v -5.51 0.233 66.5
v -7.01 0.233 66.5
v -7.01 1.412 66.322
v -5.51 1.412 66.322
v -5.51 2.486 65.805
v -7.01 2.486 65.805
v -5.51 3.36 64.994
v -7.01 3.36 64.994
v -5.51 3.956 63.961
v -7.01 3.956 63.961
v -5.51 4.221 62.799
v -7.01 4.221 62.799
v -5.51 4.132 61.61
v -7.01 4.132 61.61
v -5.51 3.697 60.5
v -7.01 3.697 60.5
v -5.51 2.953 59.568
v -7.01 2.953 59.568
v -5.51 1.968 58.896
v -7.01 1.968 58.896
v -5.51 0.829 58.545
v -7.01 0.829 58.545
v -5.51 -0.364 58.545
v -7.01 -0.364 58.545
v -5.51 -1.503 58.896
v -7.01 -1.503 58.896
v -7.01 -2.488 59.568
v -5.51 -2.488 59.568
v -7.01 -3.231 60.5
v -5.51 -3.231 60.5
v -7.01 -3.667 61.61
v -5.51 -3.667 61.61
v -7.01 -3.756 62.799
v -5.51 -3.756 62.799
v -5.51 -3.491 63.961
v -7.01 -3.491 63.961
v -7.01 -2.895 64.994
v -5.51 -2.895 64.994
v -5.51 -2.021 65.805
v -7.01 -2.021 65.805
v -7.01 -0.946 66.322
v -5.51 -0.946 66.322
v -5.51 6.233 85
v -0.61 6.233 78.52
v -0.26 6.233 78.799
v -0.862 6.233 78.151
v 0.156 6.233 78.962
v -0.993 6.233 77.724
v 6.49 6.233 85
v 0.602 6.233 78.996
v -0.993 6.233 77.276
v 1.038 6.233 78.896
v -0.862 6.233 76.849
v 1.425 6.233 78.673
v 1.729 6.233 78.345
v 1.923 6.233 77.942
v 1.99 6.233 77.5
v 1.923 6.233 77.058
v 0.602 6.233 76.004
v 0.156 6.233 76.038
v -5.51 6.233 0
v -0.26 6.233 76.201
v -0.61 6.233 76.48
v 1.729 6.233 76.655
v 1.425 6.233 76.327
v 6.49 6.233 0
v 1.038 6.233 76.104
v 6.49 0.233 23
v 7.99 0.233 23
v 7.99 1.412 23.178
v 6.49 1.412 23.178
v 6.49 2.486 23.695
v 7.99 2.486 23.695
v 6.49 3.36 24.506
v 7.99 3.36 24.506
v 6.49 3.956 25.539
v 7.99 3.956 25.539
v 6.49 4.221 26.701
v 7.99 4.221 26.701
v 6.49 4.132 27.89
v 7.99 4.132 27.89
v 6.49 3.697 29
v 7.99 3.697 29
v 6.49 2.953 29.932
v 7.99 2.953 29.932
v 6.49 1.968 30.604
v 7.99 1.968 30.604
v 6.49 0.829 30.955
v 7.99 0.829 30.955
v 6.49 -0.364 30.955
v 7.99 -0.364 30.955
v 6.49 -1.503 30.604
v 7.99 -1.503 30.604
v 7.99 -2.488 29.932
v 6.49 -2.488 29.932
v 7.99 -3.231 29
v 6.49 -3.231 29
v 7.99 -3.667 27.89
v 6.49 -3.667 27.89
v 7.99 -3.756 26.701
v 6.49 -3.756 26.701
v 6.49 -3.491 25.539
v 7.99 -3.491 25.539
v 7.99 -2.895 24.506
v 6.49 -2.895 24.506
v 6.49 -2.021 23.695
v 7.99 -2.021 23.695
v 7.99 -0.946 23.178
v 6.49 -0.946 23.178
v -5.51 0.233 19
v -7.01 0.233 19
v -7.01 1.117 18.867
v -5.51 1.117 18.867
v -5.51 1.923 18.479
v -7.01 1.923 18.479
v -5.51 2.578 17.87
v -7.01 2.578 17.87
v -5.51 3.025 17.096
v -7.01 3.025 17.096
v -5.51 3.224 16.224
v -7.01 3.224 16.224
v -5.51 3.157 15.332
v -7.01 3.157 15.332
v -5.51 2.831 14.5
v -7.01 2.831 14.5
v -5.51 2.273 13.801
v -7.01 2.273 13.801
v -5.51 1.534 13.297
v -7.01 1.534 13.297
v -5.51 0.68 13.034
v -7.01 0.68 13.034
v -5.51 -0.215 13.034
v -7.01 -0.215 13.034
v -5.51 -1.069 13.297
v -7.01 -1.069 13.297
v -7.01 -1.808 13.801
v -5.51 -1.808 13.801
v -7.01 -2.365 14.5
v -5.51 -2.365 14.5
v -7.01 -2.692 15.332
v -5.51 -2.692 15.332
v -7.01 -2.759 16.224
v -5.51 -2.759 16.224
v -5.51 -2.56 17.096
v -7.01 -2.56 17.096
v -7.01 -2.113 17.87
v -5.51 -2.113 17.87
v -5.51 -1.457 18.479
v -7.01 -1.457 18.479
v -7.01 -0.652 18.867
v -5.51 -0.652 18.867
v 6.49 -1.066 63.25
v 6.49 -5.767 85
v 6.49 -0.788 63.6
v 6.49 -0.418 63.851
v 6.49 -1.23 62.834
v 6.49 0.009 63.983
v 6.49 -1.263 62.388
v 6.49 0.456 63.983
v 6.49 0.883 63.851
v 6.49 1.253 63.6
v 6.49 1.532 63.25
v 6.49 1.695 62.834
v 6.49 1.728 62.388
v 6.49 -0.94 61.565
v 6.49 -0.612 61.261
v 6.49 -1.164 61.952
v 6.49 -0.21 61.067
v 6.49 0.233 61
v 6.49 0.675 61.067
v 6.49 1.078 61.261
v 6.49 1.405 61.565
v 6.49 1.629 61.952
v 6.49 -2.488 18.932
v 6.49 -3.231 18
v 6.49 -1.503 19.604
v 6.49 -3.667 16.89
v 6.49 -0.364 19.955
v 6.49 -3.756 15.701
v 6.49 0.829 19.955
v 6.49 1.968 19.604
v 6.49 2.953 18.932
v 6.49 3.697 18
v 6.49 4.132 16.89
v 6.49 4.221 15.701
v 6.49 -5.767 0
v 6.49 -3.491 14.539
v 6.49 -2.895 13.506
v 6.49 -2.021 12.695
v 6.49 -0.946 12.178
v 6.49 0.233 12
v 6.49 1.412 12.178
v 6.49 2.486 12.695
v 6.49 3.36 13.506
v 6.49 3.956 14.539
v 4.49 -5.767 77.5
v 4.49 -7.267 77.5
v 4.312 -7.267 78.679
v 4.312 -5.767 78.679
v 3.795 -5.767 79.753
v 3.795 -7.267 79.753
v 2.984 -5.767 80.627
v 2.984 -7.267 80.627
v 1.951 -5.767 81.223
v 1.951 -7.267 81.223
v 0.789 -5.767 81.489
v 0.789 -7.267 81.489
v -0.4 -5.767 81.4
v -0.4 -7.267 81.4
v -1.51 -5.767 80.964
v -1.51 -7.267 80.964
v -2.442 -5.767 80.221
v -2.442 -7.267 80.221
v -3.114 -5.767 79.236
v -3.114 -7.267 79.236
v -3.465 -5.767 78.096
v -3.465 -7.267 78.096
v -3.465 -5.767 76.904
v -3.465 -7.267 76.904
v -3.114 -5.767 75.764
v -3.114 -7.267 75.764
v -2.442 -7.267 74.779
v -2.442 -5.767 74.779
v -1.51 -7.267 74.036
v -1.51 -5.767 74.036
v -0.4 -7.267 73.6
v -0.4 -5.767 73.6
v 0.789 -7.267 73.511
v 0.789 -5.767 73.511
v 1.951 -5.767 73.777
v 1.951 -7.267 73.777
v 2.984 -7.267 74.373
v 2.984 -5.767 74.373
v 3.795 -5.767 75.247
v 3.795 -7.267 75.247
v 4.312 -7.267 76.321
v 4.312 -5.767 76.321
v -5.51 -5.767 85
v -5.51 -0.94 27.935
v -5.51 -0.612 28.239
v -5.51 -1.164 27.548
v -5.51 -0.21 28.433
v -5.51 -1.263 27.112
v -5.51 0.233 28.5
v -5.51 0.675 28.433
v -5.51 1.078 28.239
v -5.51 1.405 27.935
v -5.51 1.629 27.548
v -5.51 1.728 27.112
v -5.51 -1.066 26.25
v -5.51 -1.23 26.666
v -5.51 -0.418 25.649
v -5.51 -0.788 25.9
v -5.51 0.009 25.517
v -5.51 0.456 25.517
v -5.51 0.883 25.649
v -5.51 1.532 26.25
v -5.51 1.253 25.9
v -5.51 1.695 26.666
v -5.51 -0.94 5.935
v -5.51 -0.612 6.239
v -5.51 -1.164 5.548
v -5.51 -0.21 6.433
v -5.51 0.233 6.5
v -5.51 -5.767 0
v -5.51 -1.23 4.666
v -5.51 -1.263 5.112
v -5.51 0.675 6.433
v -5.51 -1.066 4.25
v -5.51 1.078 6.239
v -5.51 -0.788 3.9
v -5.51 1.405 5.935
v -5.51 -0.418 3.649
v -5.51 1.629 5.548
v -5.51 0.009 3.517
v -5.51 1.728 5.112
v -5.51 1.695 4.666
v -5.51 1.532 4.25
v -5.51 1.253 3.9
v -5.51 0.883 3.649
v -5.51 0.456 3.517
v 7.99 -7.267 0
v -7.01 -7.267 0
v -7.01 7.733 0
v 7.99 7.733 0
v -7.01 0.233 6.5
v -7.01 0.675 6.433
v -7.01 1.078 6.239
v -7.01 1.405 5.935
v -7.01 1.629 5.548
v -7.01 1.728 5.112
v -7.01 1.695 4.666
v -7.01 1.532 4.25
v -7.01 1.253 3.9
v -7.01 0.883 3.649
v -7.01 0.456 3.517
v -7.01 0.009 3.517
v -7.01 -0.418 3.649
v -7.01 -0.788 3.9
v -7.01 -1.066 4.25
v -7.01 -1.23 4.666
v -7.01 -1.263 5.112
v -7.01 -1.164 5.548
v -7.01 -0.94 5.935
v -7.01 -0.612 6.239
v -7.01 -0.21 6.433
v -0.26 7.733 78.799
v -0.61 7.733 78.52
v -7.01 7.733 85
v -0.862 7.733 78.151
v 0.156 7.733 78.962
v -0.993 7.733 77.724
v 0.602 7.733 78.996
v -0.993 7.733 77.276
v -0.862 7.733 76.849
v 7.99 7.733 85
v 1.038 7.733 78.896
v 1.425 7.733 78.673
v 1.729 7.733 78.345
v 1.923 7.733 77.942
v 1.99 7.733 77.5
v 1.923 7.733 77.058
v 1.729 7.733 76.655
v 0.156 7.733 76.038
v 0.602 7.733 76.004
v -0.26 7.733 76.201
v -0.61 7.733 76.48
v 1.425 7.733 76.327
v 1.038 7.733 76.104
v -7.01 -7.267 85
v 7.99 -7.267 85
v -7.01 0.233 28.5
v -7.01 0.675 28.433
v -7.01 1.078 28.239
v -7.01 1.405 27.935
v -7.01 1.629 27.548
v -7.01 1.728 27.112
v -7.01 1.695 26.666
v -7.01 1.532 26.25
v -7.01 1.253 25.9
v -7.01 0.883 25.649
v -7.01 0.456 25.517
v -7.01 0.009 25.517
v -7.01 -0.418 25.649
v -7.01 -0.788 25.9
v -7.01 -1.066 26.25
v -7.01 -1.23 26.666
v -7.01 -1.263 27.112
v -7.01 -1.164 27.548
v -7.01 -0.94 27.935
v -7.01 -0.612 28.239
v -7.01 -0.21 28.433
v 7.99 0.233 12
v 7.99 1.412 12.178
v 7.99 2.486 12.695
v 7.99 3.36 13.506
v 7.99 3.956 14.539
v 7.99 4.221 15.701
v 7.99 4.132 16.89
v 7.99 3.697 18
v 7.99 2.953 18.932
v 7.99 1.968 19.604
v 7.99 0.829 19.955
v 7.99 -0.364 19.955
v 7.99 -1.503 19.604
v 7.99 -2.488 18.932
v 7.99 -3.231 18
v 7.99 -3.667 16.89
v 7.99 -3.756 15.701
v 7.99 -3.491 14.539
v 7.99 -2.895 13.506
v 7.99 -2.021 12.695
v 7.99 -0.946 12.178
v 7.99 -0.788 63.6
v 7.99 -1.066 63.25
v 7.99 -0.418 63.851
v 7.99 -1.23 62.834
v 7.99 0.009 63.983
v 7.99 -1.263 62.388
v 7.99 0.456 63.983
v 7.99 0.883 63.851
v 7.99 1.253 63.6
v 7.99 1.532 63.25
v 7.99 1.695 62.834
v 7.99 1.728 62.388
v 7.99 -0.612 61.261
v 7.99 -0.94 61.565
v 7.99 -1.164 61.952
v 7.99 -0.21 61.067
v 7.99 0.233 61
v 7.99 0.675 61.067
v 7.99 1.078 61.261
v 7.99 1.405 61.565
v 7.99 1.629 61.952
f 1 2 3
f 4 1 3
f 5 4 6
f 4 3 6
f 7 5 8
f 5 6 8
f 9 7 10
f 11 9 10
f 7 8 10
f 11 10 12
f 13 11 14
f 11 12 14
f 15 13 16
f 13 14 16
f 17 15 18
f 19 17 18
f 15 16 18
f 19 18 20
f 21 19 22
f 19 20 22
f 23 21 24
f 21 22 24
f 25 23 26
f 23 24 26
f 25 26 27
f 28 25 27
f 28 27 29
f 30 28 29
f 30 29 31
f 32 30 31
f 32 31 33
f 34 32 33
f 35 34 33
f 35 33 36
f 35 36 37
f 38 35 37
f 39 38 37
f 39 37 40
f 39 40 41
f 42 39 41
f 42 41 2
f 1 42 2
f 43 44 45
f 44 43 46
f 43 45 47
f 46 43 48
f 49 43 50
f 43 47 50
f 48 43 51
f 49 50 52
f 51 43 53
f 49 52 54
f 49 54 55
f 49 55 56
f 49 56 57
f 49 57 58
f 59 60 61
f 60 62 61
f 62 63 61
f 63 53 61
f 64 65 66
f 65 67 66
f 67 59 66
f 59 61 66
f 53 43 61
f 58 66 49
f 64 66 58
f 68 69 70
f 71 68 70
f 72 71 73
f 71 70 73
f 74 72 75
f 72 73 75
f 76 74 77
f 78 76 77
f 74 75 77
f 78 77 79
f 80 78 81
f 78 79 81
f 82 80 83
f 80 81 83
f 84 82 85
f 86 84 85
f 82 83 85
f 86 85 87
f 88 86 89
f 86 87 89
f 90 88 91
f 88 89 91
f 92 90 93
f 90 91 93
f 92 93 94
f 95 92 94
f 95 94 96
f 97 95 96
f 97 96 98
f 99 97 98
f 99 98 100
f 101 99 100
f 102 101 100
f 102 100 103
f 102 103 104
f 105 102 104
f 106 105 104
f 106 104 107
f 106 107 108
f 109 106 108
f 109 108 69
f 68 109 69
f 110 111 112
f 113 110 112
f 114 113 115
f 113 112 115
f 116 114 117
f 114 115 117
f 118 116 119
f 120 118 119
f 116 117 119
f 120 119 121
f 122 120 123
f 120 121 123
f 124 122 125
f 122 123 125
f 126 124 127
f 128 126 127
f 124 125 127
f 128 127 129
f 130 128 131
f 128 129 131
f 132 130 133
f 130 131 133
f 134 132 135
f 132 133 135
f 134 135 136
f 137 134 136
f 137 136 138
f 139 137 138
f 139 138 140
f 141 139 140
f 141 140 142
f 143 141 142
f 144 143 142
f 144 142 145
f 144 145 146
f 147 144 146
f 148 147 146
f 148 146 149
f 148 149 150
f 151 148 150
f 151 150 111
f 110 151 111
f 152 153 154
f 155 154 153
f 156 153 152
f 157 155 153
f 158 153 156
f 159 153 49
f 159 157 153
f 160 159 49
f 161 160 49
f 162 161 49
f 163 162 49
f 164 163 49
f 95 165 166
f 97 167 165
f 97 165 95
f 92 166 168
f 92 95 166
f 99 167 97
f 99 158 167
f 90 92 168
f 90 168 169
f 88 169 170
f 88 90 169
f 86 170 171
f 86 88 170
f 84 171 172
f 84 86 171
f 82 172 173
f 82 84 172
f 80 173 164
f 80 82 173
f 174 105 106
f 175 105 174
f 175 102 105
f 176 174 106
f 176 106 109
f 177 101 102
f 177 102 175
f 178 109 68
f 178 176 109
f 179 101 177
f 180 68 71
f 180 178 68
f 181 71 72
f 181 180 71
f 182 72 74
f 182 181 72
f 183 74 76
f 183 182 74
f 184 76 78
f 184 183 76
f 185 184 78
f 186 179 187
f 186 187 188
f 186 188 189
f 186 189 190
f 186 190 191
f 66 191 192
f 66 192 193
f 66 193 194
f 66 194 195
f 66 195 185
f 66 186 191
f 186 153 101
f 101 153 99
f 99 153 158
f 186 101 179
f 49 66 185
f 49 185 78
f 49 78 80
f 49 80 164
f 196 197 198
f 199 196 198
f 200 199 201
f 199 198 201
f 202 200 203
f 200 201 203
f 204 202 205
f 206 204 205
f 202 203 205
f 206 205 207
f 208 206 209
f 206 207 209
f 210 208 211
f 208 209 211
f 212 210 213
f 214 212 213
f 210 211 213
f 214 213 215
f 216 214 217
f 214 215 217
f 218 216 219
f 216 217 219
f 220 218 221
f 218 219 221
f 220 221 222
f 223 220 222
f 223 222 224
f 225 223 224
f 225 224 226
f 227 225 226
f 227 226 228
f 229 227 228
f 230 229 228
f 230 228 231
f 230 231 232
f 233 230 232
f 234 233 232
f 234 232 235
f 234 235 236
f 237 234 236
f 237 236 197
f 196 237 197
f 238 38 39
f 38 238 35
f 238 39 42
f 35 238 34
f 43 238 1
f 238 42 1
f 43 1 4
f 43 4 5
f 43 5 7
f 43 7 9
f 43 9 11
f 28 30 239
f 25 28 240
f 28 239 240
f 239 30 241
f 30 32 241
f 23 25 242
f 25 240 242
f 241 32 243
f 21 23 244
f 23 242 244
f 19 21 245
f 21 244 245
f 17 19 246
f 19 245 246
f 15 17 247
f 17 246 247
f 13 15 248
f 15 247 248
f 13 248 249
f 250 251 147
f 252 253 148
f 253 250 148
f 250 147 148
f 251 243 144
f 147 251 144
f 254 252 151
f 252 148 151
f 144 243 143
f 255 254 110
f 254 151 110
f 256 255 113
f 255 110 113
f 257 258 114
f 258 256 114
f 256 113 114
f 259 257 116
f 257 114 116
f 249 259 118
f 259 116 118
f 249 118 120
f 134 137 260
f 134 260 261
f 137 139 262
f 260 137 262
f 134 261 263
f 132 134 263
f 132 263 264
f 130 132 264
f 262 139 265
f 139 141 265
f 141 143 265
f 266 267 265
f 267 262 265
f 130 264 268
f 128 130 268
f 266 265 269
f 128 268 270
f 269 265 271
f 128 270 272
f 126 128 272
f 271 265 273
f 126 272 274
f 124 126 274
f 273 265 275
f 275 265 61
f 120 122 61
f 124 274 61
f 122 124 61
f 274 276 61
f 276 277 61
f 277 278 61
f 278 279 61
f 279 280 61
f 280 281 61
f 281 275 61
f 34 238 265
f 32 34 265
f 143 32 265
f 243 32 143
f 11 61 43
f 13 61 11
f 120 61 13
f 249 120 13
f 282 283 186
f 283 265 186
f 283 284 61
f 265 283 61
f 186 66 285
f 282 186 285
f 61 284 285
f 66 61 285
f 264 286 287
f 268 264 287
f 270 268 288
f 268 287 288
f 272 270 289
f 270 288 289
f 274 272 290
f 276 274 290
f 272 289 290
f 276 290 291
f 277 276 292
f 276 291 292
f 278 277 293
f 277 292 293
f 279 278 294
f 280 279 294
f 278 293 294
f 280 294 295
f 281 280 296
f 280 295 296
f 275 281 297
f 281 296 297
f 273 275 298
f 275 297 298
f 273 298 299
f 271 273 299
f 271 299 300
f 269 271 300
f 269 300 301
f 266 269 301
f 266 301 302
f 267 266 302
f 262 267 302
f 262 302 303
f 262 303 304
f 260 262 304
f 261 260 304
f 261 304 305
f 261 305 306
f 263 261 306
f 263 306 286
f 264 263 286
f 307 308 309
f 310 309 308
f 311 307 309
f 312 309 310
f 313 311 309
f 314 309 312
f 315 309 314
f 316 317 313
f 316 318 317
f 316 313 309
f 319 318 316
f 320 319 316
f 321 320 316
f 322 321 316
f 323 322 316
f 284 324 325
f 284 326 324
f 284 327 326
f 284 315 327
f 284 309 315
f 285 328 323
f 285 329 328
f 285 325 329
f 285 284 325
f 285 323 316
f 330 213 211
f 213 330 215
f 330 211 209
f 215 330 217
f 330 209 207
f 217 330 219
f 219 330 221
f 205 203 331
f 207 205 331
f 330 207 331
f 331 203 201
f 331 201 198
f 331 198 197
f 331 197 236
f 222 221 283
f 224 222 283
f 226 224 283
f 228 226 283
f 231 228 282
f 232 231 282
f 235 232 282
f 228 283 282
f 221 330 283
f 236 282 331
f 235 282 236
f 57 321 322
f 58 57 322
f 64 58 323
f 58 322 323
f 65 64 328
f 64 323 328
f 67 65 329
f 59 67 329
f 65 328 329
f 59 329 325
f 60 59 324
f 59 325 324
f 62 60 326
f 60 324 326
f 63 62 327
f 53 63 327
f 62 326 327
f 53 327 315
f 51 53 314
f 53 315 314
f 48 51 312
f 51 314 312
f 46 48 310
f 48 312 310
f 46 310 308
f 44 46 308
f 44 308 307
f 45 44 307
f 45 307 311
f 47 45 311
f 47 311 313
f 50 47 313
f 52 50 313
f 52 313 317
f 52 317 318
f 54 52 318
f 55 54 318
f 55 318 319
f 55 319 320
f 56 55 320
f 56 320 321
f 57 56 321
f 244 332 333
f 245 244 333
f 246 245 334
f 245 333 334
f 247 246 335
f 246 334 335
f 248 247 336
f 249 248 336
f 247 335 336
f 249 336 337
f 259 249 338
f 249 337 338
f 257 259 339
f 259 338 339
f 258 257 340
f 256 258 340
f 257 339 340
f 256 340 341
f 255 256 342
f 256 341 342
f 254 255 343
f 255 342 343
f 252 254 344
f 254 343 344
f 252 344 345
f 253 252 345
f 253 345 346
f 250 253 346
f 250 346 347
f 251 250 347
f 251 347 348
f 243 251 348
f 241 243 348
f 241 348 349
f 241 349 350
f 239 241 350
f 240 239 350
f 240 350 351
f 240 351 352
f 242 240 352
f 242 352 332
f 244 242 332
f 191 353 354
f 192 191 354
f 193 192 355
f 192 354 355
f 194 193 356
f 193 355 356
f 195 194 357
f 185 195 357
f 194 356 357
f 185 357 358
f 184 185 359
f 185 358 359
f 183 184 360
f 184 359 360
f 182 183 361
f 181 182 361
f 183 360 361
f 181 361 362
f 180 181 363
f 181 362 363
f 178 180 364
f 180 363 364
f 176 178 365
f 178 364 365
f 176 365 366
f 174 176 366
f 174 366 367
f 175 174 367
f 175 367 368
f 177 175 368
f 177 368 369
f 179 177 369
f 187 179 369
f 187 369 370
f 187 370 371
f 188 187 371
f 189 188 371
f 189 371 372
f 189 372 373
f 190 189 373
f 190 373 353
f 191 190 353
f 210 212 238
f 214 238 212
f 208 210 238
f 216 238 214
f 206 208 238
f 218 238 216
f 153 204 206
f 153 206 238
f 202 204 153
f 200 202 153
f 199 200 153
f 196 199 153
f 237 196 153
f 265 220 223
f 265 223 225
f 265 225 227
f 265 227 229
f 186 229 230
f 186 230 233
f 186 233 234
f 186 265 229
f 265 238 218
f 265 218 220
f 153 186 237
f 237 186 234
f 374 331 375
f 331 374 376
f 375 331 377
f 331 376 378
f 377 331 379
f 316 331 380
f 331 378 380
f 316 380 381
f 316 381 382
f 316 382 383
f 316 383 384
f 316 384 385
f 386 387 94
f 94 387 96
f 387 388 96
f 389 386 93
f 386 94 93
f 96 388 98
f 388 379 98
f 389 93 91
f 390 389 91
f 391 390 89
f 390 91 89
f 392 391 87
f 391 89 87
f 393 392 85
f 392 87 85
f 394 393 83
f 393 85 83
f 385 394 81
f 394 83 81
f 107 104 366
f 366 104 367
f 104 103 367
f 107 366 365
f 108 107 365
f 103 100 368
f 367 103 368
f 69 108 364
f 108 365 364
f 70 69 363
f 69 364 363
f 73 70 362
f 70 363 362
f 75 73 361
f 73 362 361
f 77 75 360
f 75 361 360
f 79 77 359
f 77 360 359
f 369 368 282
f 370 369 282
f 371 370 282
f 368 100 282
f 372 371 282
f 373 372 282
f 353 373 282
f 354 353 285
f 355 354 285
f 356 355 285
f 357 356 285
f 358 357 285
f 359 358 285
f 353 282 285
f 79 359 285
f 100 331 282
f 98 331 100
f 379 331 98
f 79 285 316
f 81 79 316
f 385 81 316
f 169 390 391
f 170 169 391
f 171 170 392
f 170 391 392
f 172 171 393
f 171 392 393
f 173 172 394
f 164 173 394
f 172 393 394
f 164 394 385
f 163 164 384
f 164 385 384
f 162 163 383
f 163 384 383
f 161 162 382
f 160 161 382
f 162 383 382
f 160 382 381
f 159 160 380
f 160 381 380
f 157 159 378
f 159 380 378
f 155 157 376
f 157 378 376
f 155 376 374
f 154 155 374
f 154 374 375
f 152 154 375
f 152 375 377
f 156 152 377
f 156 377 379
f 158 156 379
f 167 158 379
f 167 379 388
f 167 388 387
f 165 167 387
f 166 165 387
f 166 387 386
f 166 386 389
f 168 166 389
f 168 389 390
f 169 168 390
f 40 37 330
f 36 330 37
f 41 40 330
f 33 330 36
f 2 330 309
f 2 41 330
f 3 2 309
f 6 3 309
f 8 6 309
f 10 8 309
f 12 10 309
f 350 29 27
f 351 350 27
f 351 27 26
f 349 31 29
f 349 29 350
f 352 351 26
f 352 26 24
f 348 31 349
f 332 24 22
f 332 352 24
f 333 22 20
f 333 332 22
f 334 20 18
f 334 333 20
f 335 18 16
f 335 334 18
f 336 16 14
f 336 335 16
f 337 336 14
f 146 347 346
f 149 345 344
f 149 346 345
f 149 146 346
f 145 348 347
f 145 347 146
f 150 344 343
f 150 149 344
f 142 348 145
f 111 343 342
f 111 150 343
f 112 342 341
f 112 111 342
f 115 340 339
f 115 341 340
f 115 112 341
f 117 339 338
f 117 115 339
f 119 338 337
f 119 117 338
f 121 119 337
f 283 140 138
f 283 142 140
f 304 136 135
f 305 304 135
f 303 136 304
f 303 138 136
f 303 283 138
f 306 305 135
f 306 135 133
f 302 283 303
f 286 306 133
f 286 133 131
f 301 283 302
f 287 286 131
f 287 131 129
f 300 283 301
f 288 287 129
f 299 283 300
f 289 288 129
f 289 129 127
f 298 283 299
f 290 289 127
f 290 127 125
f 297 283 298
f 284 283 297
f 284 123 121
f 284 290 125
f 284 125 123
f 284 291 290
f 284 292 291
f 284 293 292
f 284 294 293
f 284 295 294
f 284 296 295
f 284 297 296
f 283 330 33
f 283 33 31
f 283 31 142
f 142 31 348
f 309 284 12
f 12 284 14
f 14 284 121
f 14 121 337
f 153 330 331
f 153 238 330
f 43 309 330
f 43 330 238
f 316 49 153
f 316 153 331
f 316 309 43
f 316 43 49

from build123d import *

# Parameters (mm, degrees)
SKETCH_1_W          = 15
SKETCH_1_H          = 15
SKETCH_1_W_2        = 12
SKETCH_1_H_2        = 12
EXTRUDE_2_DEPTH     = 85
SKETCH_3_R          = 1.5
CUT_EXTRUDE_2_DEPTH = 10
SKETCH_4_R          = 1.5
CUT_EXTRUDE_3_DEPTH = 10
SKETCH_5_R          = 4
CUT_EXTRUDE_4_DEPTH = 10
SKETCH_6_R          = 4
CUT_EXTRUDE_5_DEPTH = 10
SKETCH_7_R          = 3
CUT_EXTRUDE_6_DEPTH = 10
SKETCH_8_R          = 1.5
CUT_EXTRUDE_7_DEPTH = 10
SKETCH_9_R          = 1.5
CUT_EXTRUDE_8_DEPTH = 10
SKETCH_10_R         = 4
CUT_EXTRUDE_9_DEPTH = 10


with BuildPart() as part:
    # ｽｹｯﾁ1 → ﾎﾞｽ - 押し出し2 (new body)
    with BuildSketch(Plane.XY):
        with Locations((0.489915859, 0.232626086)):
            Rectangle(SKETCH_1_W, SKETCH_1_H)
        with Locations((0.489915859, 0.232626086)):
            Rectangle(SKETCH_1_W_2, SKETCH_1_H_2, mode=Mode.SUBTRACT)
    extrude(amount=EXTRUDE_2_DEPTH)

    # ｽｹｯﾁ3 → ｶｯﾄ - 押し出し2 (cut)
    with BuildSketch(Plane(origin=(0, 7.732626086, 0), x_dir=(1, 0, 0), z_dir=(0, 1, 0))):
        with Locations((0.489915859, -77.5)):
            Circle(SKETCH_3_R)
    extrude(amount=-CUT_EXTRUDE_2_DEPTH, mode=Mode.SUBTRACT)

    # ｽｹｯﾁ4 → ｶｯﾄ - 押し出し3 (cut)
    with BuildSketch(Plane(origin=(7.989915859, 0, 0), x_dir=(0, 0, -1), z_dir=(1, 0, 0))):
        with Locations((-62.5, 0.232626086)):
            Circle(SKETCH_4_R)
    extrude(amount=-CUT_EXTRUDE_3_DEPTH, mode=Mode.SUBTRACT)

    # ｽｹｯﾁ5 → ｶｯﾄ - 押し出し4 (cut)
    with BuildSketch(Plane.XZ.offset(7.267373914)):
        with Locations((0.489915859, 77.5)):
            Circle(SKETCH_5_R)
    extrude(amount=-CUT_EXTRUDE_4_DEPTH, mode=Mode.SUBTRACT)

    # ｽｹｯﾁ6 → ｶｯﾄ - 押し出し5 (cut)
    with BuildSketch(Plane.ZY.offset(7.010084141)):
        with Locations((62.5, 0.232626086)):
            Circle(SKETCH_6_R)
    extrude(amount=-CUT_EXTRUDE_5_DEPTH, mode=Mode.SUBTRACT)

    # ｽｹｯﾁ7 → ｶｯﾄ - 押し出し6 (cut)
    with BuildSketch(Plane.ZY.offset(7.010084141)):
        with Locations((16, 0.232626086)):
            Circle(SKETCH_7_R)
    extrude(amount=-CUT_EXTRUDE_6_DEPTH, mode=Mode.SUBTRACT)

    # ｽｹｯﾁ8 → ｶｯﾄ - 押し出し7 (cut)
    with BuildSketch(Plane.ZY.offset(7.010084141)):
        with Locations((5, 0.232626086)):
            Circle(SKETCH_8_R)
    extrude(amount=-CUT_EXTRUDE_7_DEPTH, mode=Mode.SUBTRACT)

    # ｽｹｯﾁ9 → ｶｯﾄ - 押し出し8 (cut)
    with BuildSketch(Plane.ZY.offset(7.010084141)):
        with Locations((27, 0.232626086)):
            Circle(SKETCH_9_R)
    extrude(amount=-CUT_EXTRUDE_8_DEPTH, mode=Mode.SUBTRACT)

    # ｽｹｯﾁ10 → ｶｯﾄ - 押し出し9 (cut)
    with BuildSketch(Plane(origin=(7.989915859, 0, 0), x_dir=(0, 0, -1), z_dir=(1, 0, 0))):
        with Locations((-16, 0.232626086)):
            Circle(SKETCH_10_R)
        with Locations((-27, 0.232626086)):
            Circle(SKETCH_10_R)
    extrude(amount=-CUT_EXTRUDE_9_DEPTH, mode=Mode.SUBTRACT)


solid = part.part
